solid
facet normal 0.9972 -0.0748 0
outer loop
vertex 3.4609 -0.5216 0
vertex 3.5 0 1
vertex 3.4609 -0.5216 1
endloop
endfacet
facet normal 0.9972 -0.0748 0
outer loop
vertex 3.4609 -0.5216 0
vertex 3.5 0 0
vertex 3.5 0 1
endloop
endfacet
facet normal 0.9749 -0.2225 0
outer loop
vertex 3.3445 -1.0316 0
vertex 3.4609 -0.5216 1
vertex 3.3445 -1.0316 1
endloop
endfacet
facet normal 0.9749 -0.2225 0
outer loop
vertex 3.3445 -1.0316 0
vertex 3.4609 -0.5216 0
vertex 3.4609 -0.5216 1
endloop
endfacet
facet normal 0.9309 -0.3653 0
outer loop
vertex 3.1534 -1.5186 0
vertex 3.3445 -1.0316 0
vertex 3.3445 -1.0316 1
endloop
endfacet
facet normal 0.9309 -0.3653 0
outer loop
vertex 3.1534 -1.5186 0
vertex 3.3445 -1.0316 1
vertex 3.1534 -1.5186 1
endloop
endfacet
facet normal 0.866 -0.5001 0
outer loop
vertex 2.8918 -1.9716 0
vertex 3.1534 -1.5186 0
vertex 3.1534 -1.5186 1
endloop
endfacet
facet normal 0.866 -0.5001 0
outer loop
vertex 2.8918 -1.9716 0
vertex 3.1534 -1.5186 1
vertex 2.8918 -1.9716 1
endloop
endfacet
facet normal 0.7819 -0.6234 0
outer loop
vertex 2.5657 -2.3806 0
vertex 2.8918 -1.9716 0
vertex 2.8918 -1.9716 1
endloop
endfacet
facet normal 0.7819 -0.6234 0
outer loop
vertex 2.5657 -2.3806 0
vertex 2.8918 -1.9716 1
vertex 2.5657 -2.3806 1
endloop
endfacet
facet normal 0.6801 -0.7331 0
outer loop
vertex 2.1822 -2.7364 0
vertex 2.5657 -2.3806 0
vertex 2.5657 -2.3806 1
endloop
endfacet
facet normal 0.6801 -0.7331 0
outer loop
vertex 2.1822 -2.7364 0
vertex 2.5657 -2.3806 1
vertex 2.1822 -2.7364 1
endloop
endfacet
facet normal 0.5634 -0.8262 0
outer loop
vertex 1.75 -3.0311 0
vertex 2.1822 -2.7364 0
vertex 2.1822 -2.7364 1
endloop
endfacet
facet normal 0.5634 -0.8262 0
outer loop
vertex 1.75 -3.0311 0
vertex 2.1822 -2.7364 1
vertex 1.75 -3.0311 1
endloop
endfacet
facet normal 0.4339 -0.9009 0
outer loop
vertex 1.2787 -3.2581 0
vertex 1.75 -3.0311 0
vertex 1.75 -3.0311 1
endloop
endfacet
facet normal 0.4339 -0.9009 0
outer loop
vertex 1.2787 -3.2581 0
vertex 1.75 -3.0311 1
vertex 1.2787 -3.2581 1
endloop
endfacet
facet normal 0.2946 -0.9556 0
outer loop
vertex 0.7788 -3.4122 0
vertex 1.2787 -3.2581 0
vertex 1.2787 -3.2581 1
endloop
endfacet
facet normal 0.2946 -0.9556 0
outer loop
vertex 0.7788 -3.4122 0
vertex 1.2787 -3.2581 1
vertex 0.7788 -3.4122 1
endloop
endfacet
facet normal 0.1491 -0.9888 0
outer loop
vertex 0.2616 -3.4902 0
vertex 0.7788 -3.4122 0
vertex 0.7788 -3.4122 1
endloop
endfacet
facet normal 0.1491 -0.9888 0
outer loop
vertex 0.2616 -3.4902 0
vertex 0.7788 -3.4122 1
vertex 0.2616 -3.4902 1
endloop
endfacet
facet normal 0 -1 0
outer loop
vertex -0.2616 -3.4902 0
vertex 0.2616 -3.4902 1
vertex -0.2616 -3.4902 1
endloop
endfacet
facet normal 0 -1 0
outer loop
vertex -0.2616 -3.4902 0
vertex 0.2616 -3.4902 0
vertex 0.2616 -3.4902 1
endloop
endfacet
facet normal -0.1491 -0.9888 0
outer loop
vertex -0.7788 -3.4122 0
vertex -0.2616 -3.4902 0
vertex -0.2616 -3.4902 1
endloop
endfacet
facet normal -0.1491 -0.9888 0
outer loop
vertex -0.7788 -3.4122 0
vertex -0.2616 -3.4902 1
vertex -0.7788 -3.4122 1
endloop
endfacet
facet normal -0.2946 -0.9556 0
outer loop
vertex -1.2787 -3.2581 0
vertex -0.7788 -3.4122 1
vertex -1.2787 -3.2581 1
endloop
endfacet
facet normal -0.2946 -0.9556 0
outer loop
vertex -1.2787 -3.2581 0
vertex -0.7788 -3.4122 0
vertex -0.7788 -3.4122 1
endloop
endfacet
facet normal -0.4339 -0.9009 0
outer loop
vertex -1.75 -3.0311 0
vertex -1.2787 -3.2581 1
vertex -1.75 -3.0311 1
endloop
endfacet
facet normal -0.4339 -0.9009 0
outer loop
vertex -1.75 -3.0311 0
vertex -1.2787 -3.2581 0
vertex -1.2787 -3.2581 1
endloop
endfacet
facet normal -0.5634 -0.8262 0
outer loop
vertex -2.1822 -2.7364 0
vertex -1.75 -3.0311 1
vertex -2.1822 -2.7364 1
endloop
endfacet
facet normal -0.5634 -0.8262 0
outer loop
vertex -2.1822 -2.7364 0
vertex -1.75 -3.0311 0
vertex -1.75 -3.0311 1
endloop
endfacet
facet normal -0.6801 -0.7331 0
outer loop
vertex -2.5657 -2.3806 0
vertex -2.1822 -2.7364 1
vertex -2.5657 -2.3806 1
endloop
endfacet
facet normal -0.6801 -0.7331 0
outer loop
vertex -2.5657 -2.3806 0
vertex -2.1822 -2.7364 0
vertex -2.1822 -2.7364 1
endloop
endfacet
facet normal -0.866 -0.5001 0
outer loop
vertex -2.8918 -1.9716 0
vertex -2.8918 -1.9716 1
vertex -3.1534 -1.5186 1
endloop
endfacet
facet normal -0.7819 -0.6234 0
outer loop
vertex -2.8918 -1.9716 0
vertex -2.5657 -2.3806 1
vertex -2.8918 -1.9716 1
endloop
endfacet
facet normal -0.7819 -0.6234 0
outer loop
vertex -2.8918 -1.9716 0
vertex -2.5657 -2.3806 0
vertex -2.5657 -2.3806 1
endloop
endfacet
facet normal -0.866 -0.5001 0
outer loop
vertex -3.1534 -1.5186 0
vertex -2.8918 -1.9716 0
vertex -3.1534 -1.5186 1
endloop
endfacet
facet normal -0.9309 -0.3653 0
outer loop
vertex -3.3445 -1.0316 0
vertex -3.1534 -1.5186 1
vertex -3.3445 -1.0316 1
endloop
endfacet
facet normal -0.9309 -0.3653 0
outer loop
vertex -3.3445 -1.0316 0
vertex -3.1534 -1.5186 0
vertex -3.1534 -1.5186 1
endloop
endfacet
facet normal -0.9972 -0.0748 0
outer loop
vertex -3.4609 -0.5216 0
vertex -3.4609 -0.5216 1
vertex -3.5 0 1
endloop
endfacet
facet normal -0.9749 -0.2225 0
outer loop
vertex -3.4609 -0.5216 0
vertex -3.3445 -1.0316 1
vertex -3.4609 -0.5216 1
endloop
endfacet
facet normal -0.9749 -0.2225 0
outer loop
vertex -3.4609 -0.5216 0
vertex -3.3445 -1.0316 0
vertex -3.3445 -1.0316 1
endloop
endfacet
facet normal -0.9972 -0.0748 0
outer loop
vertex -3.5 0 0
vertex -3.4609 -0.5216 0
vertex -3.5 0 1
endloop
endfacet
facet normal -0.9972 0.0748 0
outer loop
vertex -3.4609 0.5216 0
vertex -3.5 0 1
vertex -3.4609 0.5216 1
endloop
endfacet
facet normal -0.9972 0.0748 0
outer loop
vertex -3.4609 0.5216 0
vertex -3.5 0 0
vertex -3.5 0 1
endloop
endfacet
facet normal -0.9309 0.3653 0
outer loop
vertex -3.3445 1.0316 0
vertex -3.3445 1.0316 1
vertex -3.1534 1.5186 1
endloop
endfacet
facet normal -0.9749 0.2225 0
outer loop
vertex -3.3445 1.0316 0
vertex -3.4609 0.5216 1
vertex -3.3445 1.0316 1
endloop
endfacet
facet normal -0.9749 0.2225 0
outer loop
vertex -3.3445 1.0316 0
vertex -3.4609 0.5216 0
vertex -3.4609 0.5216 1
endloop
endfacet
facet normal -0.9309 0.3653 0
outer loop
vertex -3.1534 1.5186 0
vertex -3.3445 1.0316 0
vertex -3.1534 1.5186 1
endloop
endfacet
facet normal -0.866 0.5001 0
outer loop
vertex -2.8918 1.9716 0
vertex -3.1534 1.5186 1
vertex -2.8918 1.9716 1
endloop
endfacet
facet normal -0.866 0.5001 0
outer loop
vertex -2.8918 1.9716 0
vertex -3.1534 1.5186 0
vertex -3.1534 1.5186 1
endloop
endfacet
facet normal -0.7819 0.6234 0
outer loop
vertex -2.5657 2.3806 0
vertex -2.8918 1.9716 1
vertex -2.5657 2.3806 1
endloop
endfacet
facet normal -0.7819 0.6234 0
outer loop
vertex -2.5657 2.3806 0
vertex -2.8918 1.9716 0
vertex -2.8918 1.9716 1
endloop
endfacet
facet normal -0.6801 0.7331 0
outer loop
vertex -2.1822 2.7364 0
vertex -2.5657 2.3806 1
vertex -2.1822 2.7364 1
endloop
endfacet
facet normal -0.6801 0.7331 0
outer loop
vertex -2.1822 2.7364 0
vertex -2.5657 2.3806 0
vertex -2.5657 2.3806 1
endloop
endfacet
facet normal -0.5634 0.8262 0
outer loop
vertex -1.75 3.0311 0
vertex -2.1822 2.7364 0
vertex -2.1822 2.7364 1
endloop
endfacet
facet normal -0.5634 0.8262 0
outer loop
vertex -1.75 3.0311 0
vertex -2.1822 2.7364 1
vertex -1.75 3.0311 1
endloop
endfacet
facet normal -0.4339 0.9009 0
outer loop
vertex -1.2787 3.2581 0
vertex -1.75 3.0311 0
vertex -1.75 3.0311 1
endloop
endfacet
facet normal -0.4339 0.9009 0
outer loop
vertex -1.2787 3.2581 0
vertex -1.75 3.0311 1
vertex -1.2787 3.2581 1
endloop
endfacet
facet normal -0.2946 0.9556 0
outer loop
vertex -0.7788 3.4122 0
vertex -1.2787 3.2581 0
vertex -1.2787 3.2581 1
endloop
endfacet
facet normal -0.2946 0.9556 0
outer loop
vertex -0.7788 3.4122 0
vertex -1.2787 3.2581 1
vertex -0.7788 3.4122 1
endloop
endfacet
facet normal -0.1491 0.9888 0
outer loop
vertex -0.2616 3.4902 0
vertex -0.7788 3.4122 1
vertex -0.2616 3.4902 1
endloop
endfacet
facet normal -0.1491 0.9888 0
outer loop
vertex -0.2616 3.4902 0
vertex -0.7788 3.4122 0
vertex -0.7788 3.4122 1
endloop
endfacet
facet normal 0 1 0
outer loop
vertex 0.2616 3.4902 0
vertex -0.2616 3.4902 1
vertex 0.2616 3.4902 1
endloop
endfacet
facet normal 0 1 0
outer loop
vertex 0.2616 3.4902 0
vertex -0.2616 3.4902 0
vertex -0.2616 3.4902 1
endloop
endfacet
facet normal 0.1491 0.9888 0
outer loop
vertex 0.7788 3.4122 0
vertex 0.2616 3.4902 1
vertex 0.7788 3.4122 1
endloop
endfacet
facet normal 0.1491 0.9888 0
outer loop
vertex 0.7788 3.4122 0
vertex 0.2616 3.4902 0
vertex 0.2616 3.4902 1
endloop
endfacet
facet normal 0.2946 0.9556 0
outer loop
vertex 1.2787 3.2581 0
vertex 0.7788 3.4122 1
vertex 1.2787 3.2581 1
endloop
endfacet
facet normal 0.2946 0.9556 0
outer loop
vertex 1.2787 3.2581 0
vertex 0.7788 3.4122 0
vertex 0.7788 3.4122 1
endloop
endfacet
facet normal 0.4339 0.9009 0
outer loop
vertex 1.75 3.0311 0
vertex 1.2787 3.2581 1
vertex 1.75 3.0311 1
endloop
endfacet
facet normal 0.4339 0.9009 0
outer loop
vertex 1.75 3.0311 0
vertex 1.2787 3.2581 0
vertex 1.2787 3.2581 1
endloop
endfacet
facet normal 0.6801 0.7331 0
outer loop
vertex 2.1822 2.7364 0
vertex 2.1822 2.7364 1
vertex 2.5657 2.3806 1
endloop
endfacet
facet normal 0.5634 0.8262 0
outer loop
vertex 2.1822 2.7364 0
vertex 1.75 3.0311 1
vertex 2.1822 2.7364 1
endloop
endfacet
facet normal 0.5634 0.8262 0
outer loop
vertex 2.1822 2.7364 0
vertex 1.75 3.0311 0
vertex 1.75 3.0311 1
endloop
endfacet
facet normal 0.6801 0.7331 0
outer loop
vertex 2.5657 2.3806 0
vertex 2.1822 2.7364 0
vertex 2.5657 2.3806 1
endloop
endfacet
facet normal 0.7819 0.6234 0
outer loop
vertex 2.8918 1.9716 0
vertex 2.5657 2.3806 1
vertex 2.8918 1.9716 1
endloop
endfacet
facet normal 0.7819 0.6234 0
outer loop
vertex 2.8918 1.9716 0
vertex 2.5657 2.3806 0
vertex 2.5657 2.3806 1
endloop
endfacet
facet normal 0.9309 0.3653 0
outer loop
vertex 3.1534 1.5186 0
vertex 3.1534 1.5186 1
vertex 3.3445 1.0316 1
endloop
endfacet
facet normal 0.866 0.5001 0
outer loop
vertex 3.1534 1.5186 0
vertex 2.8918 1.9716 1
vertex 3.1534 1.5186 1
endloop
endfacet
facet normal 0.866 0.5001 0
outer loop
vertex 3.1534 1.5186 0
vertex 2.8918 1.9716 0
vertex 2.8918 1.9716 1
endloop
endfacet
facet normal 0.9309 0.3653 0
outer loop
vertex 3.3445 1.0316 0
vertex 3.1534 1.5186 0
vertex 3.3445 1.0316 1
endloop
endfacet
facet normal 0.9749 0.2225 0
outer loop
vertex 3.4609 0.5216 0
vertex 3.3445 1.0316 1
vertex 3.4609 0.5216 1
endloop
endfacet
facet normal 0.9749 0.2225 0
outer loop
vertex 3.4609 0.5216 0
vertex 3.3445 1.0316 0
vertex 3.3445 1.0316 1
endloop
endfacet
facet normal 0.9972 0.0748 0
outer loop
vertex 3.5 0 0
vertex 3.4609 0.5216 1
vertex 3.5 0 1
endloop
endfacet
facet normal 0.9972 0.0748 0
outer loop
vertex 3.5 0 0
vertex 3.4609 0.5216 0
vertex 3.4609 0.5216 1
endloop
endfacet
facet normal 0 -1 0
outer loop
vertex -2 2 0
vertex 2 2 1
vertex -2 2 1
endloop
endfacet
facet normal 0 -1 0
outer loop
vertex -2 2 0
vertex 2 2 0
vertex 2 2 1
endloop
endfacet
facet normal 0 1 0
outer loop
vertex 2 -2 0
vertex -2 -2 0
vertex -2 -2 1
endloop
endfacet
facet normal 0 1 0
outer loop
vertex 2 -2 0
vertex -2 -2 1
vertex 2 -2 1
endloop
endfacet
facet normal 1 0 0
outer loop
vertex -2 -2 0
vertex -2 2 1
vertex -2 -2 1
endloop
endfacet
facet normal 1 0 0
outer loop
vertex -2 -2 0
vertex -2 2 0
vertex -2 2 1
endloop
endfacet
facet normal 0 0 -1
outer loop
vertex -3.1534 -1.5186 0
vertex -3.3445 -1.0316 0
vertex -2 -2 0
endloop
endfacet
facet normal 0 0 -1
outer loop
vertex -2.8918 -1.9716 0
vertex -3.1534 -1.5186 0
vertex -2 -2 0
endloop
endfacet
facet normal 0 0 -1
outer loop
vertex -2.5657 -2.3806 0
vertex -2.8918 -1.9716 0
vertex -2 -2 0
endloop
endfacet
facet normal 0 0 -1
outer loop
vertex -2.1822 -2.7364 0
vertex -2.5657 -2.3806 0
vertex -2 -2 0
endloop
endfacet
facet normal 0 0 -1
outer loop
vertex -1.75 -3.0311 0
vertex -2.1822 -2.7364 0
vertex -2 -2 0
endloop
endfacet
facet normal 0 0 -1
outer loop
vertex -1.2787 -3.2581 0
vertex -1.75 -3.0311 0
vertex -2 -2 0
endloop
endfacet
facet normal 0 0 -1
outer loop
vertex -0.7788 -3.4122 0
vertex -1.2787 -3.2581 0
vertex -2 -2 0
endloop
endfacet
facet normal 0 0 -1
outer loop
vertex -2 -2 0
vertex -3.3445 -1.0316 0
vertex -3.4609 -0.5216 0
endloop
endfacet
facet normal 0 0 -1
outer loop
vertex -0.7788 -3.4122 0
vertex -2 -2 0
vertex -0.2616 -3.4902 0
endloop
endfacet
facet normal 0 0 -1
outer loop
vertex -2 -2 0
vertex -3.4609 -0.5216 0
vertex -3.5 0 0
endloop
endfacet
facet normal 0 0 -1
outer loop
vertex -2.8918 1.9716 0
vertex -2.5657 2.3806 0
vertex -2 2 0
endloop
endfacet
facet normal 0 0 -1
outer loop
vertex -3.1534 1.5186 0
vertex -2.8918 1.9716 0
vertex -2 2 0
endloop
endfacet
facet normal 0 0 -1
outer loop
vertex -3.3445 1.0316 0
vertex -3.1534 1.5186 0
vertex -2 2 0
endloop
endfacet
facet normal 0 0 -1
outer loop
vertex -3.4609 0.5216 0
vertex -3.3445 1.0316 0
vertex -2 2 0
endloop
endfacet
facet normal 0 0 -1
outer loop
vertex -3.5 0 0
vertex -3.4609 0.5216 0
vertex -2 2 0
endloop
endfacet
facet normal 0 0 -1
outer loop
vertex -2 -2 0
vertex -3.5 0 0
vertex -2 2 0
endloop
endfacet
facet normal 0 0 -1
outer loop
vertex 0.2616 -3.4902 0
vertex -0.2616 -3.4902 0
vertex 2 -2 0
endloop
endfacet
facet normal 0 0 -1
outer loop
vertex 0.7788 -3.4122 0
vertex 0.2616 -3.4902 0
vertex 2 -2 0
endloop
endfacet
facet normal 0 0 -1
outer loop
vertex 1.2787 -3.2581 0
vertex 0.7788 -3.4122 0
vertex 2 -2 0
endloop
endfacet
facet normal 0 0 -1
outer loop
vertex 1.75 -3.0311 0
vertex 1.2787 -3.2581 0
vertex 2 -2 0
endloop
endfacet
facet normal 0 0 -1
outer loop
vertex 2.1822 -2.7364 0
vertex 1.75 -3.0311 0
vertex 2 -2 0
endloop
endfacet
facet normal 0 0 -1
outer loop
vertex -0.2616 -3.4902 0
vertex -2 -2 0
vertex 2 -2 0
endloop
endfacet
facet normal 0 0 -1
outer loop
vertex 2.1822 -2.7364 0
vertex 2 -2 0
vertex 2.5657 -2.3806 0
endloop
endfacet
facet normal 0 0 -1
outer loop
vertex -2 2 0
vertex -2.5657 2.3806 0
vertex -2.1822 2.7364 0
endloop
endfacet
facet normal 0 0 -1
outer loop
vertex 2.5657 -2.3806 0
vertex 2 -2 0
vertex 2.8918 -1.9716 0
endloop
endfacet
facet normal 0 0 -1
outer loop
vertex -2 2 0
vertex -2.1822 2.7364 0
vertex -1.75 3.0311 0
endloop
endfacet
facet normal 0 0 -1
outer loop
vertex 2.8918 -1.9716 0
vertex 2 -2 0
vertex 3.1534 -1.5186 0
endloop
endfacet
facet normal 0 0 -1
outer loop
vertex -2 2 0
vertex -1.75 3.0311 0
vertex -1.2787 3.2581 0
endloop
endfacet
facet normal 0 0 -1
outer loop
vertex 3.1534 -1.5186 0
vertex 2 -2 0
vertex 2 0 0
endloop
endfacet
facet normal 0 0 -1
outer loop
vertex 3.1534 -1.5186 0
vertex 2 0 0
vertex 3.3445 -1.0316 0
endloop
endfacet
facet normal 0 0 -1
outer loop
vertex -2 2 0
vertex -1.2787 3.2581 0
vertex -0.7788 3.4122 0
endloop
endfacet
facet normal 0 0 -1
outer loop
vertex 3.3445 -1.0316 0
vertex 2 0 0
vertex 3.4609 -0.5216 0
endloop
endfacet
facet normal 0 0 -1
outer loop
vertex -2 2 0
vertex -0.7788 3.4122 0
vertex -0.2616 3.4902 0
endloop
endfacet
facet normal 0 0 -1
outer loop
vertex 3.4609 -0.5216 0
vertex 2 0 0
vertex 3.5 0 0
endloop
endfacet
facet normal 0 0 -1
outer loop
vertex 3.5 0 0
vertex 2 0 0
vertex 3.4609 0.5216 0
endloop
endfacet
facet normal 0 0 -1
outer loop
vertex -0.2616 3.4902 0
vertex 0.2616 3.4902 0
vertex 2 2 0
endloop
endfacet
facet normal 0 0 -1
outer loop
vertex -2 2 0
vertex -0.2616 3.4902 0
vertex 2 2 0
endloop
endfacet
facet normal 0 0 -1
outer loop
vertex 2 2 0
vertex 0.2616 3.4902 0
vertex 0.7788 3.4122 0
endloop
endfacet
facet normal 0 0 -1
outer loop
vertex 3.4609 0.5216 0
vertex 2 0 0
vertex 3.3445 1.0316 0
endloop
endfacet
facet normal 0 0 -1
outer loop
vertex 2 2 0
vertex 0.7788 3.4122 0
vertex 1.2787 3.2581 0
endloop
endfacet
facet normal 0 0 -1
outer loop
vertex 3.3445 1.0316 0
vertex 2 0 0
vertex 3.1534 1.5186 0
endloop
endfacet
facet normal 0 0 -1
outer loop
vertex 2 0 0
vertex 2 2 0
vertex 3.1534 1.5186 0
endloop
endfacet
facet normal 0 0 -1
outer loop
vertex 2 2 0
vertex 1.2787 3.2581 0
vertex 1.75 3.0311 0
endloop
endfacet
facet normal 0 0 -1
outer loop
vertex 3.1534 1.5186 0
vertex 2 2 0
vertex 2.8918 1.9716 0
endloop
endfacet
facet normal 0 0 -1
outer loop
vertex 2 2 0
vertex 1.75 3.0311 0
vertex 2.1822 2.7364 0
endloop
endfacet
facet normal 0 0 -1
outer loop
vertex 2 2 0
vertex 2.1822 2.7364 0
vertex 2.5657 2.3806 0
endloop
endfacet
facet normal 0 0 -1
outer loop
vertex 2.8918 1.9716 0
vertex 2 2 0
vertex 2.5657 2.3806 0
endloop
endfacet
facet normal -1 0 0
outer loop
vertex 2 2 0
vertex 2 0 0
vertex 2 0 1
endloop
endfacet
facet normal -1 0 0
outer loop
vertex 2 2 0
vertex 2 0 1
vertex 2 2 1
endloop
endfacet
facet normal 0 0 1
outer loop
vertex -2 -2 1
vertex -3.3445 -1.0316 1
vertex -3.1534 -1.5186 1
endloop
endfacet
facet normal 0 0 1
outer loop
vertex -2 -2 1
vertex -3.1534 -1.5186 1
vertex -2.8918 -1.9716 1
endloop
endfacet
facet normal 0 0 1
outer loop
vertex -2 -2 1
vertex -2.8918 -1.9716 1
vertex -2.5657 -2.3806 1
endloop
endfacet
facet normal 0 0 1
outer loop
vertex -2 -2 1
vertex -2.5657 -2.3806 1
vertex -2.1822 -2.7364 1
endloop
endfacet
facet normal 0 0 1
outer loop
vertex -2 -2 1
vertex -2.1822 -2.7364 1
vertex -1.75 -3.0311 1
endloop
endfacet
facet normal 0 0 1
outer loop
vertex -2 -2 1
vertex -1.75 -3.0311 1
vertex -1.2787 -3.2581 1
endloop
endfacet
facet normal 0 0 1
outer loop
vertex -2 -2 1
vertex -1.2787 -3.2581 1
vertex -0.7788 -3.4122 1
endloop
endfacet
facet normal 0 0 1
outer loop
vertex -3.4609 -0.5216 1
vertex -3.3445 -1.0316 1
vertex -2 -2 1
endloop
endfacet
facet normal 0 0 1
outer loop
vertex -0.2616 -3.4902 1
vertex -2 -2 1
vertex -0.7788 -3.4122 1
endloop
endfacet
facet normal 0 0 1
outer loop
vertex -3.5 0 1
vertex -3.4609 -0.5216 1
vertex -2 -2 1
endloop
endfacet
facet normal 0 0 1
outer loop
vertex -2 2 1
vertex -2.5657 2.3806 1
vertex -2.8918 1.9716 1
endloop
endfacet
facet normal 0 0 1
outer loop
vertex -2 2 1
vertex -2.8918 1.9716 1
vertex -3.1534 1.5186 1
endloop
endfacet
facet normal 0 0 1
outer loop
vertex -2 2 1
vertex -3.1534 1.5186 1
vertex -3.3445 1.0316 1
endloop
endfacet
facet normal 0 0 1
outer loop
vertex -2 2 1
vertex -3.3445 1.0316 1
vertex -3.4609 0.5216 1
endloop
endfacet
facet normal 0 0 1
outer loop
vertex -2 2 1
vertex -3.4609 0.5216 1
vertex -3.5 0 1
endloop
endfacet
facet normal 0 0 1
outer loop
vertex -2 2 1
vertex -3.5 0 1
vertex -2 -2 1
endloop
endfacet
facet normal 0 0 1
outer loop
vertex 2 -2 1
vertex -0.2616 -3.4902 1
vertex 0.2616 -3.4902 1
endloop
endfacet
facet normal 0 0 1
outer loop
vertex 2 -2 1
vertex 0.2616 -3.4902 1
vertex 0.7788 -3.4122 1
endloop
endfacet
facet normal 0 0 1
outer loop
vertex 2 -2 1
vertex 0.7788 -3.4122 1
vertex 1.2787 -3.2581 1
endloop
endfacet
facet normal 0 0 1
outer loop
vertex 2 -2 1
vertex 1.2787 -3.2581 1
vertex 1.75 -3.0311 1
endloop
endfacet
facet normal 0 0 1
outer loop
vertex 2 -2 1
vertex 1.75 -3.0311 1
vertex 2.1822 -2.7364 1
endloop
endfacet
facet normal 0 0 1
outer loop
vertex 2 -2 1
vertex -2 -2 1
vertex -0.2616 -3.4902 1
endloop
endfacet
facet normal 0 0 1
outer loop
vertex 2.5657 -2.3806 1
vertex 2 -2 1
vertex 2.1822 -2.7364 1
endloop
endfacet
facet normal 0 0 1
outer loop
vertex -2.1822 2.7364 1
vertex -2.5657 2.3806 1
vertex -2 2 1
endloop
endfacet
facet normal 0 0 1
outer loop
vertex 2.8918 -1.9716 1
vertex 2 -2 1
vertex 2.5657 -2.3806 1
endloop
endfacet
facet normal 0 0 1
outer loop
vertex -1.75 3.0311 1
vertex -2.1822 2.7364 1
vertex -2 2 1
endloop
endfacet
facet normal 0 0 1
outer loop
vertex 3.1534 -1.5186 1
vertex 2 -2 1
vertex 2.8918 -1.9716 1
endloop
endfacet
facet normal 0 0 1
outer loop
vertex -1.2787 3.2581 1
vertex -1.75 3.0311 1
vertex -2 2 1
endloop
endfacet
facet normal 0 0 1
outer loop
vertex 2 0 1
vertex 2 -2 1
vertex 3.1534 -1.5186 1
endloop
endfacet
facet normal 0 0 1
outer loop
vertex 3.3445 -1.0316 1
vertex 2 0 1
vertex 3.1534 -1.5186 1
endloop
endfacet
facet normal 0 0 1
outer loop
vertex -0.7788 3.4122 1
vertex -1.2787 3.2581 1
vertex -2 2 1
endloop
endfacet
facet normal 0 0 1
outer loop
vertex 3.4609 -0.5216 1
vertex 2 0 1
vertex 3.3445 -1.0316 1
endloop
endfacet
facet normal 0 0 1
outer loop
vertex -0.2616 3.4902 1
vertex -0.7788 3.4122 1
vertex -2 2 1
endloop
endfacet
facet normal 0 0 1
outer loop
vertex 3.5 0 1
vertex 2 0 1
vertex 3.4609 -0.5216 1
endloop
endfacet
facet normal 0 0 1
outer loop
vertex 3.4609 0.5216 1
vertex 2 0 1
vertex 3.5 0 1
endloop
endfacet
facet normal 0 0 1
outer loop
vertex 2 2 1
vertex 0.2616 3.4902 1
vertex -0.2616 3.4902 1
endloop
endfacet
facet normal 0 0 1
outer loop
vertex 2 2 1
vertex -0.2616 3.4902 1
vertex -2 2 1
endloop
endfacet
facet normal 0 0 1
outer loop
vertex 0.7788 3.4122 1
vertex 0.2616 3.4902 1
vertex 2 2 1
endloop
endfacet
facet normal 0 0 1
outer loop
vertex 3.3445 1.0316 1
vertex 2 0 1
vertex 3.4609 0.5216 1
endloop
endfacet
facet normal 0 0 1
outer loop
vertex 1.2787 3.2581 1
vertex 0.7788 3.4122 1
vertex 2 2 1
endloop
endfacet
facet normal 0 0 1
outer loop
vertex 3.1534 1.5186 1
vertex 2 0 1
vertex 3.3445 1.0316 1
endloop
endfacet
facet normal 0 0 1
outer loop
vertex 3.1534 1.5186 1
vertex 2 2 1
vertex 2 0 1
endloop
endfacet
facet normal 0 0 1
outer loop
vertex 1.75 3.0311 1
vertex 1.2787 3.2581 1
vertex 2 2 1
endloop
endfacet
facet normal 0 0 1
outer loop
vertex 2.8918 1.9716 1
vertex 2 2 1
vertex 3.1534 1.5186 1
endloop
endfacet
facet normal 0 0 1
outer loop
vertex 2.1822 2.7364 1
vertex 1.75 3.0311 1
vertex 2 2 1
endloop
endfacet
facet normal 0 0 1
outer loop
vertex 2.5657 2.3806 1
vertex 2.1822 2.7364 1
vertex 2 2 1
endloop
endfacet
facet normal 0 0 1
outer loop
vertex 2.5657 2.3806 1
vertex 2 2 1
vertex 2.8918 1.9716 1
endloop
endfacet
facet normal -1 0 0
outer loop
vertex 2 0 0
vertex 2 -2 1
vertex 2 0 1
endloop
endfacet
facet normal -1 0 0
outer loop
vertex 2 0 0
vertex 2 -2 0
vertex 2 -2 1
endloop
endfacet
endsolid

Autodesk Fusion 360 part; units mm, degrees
sketch "Sketch1" plane through (0, 0, 0) normal (0, 0, 1) x (1, 0, 0)
  circle A0 centre (0, 0) radius 3.5
  line L0 (0, 0) -> (2, 0)
  line L1 (2, 0) -> (2, 2)
  line L2 (2, 2) -> (-2, 2)
  line L3 (-2, 2) -> (-2, -2)
  line L4 (-2, -2) -> (2, -2)
  line L5 (2, -2) -> (2, 0)
  dimension "d1" = 7
  dimension "d2" = 2
  dimension "d3" = 2
  dimension "d4" = 4
  dimension "d5" = 4
  dimension "d6" = 4
  dimension "d7" = 2
extrude "Extrude1" add sketch "Sketch1" along normal blind 1
equation "d3 = d2"
equation "d4 = d2 * 2"
equation "d5 = d2 * 2"
equation "d6 = d2 * 2"
equation "d7 = d2"
